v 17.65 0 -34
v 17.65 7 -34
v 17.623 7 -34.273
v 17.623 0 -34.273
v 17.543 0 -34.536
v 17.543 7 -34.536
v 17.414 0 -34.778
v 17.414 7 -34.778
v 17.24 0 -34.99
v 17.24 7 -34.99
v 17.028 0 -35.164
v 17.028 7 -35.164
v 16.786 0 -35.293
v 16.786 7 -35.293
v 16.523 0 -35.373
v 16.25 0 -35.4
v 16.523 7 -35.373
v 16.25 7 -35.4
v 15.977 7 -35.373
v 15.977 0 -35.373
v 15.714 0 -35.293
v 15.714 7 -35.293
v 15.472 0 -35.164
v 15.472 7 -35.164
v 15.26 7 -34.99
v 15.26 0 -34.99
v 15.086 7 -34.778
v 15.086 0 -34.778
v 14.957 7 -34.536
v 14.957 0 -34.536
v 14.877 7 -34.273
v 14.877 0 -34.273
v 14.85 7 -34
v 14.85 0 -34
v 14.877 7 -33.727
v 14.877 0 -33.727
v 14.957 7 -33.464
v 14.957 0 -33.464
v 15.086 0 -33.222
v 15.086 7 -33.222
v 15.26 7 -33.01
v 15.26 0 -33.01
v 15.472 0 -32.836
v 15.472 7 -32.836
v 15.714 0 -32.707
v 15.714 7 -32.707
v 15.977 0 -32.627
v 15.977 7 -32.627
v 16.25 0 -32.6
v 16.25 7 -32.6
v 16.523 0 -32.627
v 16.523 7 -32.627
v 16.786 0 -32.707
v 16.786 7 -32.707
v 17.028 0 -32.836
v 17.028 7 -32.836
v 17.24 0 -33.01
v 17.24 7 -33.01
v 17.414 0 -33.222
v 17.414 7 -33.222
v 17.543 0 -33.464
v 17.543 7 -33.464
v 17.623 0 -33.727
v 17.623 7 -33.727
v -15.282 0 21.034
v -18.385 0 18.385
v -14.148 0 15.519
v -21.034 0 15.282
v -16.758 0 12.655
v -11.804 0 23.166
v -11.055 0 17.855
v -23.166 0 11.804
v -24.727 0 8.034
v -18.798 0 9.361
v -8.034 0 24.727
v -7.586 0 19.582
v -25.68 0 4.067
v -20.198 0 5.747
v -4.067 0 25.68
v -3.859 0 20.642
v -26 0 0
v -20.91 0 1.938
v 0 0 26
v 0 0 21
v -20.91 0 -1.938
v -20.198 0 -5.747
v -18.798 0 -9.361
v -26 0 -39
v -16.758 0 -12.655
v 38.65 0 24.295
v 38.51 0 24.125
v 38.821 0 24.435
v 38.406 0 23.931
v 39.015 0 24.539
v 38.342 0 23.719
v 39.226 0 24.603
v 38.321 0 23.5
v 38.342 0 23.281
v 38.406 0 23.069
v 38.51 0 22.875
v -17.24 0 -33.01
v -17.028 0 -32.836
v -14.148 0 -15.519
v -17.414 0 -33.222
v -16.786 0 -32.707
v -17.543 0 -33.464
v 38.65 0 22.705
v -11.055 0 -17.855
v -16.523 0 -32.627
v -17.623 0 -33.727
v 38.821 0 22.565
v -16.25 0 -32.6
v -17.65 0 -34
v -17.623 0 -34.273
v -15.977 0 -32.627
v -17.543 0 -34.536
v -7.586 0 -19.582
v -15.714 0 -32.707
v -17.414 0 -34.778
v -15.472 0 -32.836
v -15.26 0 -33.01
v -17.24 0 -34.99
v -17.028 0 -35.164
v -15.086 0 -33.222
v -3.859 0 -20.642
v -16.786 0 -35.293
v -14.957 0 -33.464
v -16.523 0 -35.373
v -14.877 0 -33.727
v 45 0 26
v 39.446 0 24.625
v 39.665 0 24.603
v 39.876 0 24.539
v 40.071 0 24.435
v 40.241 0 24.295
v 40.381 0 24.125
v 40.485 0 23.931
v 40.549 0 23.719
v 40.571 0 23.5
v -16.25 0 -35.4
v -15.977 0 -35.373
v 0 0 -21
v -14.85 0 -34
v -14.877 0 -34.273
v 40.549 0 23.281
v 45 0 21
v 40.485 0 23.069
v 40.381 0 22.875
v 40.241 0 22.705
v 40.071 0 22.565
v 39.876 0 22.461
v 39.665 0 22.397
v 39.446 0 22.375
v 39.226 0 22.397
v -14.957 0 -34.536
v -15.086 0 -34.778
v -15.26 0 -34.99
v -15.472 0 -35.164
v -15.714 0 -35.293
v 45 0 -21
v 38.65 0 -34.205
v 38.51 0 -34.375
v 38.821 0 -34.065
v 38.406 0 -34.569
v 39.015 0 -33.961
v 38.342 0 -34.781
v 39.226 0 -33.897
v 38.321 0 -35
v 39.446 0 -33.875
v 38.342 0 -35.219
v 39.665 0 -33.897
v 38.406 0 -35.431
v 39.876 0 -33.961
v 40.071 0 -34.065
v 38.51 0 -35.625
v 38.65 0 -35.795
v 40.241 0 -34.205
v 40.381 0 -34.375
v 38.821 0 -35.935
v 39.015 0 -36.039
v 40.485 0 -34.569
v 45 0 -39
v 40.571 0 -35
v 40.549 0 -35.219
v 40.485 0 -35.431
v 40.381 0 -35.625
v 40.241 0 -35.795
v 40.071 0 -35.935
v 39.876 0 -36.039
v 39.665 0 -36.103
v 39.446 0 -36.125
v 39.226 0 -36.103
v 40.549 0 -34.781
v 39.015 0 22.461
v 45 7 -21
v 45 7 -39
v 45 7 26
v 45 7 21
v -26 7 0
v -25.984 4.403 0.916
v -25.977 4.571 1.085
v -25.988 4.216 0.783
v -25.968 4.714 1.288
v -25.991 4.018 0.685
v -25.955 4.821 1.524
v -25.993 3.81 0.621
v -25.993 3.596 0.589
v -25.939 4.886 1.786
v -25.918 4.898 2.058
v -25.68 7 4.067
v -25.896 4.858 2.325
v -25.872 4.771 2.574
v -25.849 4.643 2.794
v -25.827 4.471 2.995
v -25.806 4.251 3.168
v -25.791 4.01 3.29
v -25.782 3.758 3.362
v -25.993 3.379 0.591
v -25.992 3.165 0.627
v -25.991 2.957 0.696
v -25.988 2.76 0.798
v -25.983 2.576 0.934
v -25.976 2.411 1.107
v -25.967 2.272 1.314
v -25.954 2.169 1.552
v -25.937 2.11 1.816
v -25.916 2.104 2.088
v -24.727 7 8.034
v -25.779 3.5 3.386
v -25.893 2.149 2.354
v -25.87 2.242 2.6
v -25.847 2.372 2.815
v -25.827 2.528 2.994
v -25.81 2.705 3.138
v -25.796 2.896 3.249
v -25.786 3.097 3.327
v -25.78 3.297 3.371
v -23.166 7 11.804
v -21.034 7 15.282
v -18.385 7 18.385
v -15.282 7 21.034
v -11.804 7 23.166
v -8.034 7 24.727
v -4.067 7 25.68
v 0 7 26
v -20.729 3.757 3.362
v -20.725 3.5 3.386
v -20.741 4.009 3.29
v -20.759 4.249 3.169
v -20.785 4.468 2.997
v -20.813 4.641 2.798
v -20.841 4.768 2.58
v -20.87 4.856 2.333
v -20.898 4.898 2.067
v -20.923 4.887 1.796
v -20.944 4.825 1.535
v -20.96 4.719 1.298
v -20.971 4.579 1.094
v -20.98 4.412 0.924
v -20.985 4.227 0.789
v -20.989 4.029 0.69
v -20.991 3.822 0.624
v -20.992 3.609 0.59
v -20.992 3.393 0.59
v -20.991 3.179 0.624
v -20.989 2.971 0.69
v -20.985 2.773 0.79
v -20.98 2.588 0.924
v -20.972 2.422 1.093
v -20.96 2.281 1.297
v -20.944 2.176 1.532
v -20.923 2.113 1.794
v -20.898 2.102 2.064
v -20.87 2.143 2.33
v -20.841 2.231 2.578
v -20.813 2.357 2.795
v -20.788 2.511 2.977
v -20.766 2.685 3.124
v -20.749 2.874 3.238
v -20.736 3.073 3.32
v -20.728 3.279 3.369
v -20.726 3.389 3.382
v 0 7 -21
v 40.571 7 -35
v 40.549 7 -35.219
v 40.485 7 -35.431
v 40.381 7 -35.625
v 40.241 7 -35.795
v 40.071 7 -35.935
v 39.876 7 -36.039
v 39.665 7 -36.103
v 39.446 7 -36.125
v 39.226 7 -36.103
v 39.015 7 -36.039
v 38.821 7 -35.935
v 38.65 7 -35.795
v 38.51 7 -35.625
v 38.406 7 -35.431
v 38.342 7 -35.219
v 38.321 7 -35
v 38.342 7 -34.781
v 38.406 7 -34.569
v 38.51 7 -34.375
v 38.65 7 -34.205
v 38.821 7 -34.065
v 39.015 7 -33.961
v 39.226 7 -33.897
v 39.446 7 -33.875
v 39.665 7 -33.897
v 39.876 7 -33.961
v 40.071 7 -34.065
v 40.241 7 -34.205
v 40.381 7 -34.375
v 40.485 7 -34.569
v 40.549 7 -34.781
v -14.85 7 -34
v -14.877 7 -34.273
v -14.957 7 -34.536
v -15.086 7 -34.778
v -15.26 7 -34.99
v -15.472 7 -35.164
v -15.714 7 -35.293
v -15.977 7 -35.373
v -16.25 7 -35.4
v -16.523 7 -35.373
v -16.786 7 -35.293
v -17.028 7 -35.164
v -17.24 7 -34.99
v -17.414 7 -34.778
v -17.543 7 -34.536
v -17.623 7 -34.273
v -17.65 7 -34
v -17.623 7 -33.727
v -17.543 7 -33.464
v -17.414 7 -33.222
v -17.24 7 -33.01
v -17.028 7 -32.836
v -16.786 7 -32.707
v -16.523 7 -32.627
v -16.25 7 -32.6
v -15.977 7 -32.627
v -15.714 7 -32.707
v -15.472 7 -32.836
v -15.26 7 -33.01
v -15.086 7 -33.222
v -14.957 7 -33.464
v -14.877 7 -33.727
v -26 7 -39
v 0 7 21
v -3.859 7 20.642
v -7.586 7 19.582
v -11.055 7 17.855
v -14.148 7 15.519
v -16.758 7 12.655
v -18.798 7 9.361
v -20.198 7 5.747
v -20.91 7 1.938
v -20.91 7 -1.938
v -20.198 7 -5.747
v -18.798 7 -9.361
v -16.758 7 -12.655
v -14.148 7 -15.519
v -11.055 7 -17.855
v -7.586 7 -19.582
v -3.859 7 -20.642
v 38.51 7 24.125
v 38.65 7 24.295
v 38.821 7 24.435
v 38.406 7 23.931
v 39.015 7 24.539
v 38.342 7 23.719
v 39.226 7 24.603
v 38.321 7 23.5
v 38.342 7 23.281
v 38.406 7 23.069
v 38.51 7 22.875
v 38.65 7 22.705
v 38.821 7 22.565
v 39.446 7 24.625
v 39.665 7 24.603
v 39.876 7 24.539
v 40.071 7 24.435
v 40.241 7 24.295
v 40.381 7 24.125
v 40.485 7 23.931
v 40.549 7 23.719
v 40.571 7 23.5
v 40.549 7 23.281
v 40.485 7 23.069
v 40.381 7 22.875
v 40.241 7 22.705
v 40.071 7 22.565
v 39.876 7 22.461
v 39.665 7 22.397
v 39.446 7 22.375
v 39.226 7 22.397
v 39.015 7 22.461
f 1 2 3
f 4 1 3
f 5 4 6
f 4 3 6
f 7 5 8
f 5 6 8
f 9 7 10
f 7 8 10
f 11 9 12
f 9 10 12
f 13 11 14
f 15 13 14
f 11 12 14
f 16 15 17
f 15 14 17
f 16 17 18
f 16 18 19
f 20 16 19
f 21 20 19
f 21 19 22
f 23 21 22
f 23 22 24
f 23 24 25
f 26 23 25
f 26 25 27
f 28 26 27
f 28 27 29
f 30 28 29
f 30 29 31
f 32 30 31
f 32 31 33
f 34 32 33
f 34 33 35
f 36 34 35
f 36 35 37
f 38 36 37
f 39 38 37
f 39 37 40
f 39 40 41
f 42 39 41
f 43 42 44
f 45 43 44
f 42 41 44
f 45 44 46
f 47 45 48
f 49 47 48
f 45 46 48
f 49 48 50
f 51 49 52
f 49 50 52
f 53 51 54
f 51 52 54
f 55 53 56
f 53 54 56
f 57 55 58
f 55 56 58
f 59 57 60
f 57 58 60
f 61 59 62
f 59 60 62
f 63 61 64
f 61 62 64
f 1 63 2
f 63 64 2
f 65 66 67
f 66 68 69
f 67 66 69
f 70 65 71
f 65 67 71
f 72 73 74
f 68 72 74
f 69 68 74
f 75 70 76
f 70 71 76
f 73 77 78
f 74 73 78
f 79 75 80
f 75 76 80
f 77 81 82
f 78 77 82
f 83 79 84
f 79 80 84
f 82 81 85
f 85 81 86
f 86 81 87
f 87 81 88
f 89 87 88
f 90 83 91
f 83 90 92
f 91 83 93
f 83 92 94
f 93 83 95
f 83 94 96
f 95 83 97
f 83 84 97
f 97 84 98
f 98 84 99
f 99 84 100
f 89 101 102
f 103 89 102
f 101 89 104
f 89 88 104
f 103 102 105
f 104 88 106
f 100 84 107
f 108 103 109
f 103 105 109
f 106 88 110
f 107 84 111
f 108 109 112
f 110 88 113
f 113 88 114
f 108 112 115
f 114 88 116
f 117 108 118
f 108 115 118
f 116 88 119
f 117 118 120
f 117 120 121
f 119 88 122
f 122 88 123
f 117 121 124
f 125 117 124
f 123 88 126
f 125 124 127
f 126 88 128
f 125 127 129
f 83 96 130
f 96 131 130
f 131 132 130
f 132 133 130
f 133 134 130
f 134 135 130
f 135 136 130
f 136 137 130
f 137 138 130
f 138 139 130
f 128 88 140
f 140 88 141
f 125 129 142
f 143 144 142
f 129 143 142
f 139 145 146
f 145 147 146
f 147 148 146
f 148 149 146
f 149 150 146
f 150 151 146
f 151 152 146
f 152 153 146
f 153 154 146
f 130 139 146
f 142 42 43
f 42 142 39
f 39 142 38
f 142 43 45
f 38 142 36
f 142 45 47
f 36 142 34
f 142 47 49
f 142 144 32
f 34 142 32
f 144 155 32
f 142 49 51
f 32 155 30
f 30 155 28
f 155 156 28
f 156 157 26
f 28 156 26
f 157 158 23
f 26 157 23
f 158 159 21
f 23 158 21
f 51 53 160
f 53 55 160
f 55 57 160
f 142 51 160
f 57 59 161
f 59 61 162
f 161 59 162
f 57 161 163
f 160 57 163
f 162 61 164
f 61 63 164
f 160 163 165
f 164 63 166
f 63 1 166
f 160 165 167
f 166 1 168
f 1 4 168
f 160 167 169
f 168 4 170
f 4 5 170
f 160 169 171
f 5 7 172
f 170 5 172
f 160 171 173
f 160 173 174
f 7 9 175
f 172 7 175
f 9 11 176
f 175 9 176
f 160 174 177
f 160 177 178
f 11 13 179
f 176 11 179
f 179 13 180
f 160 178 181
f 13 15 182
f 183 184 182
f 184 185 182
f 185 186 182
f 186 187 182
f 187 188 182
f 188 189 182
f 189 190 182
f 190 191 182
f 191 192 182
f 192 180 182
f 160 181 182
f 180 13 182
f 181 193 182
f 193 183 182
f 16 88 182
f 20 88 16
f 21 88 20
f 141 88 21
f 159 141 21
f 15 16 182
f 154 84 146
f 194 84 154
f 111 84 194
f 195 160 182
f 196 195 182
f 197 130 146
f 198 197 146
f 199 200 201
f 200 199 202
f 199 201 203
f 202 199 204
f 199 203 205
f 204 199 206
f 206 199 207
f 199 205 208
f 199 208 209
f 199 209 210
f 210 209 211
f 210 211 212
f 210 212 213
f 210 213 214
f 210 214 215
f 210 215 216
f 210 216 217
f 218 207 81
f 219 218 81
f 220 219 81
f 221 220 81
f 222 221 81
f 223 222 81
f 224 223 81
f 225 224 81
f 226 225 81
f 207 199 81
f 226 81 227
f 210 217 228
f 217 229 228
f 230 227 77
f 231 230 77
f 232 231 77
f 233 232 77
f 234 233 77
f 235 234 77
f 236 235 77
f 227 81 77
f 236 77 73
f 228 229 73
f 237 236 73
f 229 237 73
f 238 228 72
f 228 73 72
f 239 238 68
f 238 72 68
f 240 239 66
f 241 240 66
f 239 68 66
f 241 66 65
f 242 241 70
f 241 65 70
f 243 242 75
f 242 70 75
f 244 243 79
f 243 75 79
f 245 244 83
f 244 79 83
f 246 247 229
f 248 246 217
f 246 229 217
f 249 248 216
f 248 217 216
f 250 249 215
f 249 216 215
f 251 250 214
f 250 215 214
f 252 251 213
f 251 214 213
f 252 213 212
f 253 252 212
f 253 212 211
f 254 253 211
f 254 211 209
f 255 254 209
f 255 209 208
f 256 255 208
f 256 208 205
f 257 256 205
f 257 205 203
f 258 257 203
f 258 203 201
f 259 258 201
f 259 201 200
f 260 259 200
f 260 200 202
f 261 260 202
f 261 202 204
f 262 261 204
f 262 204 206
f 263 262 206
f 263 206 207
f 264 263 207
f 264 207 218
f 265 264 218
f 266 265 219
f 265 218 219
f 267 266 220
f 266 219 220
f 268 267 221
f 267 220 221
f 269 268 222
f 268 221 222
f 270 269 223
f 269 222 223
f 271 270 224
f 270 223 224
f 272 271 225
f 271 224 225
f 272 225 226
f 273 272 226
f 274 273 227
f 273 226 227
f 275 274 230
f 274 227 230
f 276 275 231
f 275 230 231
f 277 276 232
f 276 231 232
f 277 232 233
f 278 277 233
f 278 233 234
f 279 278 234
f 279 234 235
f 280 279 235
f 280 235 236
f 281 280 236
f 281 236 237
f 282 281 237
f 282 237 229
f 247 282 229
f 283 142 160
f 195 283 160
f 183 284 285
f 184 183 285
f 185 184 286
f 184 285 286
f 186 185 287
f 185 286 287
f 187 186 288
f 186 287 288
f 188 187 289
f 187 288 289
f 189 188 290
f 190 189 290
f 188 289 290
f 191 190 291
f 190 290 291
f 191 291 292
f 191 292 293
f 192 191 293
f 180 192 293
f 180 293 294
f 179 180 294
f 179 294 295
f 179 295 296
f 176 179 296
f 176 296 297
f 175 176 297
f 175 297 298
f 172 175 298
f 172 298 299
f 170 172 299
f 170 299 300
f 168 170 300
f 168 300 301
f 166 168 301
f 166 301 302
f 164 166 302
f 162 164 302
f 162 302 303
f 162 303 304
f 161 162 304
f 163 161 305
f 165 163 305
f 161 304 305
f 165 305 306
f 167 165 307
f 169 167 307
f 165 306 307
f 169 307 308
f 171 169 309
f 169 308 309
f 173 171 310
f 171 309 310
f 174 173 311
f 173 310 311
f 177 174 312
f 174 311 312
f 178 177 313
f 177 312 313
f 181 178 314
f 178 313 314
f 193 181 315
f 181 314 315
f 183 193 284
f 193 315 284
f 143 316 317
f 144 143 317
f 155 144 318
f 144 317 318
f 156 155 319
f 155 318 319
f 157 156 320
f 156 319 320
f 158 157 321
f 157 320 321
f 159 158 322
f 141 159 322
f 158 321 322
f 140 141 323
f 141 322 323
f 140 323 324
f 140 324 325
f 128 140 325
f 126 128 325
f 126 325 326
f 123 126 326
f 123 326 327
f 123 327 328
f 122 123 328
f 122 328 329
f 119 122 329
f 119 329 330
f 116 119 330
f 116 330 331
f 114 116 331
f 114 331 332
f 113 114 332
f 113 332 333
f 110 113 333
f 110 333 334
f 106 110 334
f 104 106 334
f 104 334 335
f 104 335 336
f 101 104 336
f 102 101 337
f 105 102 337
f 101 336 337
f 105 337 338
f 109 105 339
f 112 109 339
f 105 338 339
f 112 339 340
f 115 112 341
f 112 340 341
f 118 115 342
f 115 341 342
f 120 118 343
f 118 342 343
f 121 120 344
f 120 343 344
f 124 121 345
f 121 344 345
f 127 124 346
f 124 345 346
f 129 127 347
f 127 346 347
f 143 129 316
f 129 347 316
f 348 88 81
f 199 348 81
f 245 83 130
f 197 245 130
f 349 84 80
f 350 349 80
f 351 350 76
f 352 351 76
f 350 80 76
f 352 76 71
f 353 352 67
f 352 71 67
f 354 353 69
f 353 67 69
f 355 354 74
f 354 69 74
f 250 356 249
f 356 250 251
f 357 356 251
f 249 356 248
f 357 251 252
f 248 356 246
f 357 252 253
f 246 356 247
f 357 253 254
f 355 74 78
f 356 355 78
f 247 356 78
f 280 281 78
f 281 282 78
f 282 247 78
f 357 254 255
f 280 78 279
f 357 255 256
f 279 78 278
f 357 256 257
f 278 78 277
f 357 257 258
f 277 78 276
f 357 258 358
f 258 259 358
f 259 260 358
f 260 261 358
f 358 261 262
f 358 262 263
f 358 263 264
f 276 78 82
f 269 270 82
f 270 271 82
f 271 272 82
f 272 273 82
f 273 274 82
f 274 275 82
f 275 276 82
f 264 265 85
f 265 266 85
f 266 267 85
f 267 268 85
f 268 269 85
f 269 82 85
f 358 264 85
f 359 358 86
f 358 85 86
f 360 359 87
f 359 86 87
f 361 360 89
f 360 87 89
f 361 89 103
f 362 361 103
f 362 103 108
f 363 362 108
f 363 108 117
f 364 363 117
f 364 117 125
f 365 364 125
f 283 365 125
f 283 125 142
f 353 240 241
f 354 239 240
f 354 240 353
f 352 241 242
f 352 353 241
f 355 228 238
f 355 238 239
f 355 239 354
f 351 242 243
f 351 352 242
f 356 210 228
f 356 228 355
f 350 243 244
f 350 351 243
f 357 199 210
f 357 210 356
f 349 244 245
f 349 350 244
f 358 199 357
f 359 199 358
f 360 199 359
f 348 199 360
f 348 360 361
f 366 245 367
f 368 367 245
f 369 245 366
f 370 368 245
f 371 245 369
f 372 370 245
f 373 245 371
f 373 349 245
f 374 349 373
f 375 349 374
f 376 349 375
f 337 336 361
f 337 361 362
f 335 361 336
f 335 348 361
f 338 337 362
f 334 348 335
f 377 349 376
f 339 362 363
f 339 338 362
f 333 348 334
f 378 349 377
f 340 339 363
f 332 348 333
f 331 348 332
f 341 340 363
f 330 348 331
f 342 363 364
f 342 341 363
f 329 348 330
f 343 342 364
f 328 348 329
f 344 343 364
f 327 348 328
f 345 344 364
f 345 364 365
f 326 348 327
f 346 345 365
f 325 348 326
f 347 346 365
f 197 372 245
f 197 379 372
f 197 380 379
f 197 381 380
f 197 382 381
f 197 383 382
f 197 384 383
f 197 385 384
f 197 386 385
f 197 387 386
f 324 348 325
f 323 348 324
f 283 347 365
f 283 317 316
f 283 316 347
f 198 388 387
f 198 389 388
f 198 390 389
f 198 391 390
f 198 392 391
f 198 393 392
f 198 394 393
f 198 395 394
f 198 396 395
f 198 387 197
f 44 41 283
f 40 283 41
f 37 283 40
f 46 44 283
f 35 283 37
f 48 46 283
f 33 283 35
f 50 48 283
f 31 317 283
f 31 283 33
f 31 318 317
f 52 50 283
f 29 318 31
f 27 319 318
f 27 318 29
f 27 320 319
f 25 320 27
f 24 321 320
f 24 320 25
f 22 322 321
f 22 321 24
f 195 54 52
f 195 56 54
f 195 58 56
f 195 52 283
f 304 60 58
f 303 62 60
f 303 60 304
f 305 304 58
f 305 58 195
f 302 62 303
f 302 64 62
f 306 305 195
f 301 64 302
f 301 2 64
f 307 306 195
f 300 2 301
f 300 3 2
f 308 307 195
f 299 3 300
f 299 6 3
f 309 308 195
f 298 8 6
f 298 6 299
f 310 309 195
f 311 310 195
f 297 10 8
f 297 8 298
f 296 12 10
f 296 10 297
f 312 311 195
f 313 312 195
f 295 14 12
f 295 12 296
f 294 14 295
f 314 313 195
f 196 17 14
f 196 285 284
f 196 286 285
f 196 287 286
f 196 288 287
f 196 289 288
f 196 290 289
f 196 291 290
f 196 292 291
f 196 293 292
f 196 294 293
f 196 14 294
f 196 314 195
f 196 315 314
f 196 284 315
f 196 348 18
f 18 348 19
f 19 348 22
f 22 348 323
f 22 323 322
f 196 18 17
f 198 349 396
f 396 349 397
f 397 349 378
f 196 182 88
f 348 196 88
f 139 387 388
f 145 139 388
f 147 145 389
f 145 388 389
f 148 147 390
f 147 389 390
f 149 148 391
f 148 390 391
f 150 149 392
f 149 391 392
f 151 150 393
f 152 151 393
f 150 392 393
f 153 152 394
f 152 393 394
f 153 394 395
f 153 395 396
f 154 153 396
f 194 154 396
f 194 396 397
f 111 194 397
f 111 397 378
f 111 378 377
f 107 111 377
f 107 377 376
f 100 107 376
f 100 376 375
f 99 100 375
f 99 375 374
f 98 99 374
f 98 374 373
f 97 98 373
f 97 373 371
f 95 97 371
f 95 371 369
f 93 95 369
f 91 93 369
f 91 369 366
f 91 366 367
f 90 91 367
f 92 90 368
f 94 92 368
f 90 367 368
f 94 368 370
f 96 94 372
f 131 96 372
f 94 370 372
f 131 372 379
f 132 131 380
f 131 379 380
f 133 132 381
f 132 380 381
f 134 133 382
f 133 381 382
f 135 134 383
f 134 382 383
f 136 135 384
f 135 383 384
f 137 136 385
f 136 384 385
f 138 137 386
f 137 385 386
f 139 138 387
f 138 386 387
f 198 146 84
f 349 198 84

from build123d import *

# Parameters (mm, degrees)
EXTRUDE_1_DEPTH          = 7
SKETCH_2_R               = 1.125
CUT_EXTRUDE_2_DEPTH      = 1
CUT_EXTRUDE_2_DEPTH_BACK = 8
SKETCH_4_R               = 1.4
CUT_EXTRUDE_3_DEPTH      = 72
SKETCH_5_R               = 1.4
CUT_EXTRUDE_4_DEPTH      = 8.0000001


with BuildPart() as part:
    # 스케치1 → 보스-돌출1 (new body)
    with BuildSketch(Plane(origin=(0, 0, 0), x_dir=(1, 0, 0), z_dir=(0, 1, 0))):
        with BuildLine():
            Line((0, 21), (45, 21))
            Line((45, 21), (45, 39))
            Line((45, 39), (-26, 39))
            Line((-26, 39), (-26, 0))
            ThreePointArc((-26, 0), (-18.384776311, -18.384776311), (0, -26))
            Line((0, -26), (45, -26))
            Line((45, -26), (45, -21))
            Line((45, -21), (0, -21))
            ThreePointArc((0, -21), (-21, 0), (0, 21))
        make_face()
    extrude(amount=EXTRUDE_1_DEPTH)

    # 스케치2 → 컷-돌출2 (cut, two sides)
    with BuildSketch(Plane(origin=(0, 7, 0), x_dir=(1, 0, 0), z_dir=(0, 1, 0))) as cut_extrude_2_sk:
        with Locations((39.4457939, 35)):
            Circle(SKETCH_2_R)
        with Locations((39.4457939, -23.5)):
            Circle(SKETCH_2_R)
    extrude(amount=CUT_EXTRUDE_2_DEPTH, mode=Mode.SUBTRACT)
    extrude(cut_extrude_2_sk.sketch, amount=-CUT_EXTRUDE_2_DEPTH_BACK, mode=Mode.SUBTRACT)

    # 스케치4 → 컷-돌출3 (cut, through all)
    with BuildSketch(Plane.ZY.offset(26)):
        with Locations((1.986219712, 3.5)):
            Circle(SKETCH_4_R)
    extrude(amount=-CUT_EXTRUDE_3_DEPTH, mode=Mode.SUBTRACT)

    # 스케치5 → 컷-돌출4 (cut, through all)
    with BuildSketch(Plane(origin=(0, 7, 0), x_dir=(1, 0, 0), z_dir=(0, 1, 0))):
        with Locations((16.25, 34)):
            Circle(SKETCH_5_R)
        with Locations((-16.25, 34)):
            Circle(SKETCH_5_R)
    extrude(amount=-CUT_EXTRUDE_4_DEPTH, mode=Mode.SUBTRACT)


solid = part.part
